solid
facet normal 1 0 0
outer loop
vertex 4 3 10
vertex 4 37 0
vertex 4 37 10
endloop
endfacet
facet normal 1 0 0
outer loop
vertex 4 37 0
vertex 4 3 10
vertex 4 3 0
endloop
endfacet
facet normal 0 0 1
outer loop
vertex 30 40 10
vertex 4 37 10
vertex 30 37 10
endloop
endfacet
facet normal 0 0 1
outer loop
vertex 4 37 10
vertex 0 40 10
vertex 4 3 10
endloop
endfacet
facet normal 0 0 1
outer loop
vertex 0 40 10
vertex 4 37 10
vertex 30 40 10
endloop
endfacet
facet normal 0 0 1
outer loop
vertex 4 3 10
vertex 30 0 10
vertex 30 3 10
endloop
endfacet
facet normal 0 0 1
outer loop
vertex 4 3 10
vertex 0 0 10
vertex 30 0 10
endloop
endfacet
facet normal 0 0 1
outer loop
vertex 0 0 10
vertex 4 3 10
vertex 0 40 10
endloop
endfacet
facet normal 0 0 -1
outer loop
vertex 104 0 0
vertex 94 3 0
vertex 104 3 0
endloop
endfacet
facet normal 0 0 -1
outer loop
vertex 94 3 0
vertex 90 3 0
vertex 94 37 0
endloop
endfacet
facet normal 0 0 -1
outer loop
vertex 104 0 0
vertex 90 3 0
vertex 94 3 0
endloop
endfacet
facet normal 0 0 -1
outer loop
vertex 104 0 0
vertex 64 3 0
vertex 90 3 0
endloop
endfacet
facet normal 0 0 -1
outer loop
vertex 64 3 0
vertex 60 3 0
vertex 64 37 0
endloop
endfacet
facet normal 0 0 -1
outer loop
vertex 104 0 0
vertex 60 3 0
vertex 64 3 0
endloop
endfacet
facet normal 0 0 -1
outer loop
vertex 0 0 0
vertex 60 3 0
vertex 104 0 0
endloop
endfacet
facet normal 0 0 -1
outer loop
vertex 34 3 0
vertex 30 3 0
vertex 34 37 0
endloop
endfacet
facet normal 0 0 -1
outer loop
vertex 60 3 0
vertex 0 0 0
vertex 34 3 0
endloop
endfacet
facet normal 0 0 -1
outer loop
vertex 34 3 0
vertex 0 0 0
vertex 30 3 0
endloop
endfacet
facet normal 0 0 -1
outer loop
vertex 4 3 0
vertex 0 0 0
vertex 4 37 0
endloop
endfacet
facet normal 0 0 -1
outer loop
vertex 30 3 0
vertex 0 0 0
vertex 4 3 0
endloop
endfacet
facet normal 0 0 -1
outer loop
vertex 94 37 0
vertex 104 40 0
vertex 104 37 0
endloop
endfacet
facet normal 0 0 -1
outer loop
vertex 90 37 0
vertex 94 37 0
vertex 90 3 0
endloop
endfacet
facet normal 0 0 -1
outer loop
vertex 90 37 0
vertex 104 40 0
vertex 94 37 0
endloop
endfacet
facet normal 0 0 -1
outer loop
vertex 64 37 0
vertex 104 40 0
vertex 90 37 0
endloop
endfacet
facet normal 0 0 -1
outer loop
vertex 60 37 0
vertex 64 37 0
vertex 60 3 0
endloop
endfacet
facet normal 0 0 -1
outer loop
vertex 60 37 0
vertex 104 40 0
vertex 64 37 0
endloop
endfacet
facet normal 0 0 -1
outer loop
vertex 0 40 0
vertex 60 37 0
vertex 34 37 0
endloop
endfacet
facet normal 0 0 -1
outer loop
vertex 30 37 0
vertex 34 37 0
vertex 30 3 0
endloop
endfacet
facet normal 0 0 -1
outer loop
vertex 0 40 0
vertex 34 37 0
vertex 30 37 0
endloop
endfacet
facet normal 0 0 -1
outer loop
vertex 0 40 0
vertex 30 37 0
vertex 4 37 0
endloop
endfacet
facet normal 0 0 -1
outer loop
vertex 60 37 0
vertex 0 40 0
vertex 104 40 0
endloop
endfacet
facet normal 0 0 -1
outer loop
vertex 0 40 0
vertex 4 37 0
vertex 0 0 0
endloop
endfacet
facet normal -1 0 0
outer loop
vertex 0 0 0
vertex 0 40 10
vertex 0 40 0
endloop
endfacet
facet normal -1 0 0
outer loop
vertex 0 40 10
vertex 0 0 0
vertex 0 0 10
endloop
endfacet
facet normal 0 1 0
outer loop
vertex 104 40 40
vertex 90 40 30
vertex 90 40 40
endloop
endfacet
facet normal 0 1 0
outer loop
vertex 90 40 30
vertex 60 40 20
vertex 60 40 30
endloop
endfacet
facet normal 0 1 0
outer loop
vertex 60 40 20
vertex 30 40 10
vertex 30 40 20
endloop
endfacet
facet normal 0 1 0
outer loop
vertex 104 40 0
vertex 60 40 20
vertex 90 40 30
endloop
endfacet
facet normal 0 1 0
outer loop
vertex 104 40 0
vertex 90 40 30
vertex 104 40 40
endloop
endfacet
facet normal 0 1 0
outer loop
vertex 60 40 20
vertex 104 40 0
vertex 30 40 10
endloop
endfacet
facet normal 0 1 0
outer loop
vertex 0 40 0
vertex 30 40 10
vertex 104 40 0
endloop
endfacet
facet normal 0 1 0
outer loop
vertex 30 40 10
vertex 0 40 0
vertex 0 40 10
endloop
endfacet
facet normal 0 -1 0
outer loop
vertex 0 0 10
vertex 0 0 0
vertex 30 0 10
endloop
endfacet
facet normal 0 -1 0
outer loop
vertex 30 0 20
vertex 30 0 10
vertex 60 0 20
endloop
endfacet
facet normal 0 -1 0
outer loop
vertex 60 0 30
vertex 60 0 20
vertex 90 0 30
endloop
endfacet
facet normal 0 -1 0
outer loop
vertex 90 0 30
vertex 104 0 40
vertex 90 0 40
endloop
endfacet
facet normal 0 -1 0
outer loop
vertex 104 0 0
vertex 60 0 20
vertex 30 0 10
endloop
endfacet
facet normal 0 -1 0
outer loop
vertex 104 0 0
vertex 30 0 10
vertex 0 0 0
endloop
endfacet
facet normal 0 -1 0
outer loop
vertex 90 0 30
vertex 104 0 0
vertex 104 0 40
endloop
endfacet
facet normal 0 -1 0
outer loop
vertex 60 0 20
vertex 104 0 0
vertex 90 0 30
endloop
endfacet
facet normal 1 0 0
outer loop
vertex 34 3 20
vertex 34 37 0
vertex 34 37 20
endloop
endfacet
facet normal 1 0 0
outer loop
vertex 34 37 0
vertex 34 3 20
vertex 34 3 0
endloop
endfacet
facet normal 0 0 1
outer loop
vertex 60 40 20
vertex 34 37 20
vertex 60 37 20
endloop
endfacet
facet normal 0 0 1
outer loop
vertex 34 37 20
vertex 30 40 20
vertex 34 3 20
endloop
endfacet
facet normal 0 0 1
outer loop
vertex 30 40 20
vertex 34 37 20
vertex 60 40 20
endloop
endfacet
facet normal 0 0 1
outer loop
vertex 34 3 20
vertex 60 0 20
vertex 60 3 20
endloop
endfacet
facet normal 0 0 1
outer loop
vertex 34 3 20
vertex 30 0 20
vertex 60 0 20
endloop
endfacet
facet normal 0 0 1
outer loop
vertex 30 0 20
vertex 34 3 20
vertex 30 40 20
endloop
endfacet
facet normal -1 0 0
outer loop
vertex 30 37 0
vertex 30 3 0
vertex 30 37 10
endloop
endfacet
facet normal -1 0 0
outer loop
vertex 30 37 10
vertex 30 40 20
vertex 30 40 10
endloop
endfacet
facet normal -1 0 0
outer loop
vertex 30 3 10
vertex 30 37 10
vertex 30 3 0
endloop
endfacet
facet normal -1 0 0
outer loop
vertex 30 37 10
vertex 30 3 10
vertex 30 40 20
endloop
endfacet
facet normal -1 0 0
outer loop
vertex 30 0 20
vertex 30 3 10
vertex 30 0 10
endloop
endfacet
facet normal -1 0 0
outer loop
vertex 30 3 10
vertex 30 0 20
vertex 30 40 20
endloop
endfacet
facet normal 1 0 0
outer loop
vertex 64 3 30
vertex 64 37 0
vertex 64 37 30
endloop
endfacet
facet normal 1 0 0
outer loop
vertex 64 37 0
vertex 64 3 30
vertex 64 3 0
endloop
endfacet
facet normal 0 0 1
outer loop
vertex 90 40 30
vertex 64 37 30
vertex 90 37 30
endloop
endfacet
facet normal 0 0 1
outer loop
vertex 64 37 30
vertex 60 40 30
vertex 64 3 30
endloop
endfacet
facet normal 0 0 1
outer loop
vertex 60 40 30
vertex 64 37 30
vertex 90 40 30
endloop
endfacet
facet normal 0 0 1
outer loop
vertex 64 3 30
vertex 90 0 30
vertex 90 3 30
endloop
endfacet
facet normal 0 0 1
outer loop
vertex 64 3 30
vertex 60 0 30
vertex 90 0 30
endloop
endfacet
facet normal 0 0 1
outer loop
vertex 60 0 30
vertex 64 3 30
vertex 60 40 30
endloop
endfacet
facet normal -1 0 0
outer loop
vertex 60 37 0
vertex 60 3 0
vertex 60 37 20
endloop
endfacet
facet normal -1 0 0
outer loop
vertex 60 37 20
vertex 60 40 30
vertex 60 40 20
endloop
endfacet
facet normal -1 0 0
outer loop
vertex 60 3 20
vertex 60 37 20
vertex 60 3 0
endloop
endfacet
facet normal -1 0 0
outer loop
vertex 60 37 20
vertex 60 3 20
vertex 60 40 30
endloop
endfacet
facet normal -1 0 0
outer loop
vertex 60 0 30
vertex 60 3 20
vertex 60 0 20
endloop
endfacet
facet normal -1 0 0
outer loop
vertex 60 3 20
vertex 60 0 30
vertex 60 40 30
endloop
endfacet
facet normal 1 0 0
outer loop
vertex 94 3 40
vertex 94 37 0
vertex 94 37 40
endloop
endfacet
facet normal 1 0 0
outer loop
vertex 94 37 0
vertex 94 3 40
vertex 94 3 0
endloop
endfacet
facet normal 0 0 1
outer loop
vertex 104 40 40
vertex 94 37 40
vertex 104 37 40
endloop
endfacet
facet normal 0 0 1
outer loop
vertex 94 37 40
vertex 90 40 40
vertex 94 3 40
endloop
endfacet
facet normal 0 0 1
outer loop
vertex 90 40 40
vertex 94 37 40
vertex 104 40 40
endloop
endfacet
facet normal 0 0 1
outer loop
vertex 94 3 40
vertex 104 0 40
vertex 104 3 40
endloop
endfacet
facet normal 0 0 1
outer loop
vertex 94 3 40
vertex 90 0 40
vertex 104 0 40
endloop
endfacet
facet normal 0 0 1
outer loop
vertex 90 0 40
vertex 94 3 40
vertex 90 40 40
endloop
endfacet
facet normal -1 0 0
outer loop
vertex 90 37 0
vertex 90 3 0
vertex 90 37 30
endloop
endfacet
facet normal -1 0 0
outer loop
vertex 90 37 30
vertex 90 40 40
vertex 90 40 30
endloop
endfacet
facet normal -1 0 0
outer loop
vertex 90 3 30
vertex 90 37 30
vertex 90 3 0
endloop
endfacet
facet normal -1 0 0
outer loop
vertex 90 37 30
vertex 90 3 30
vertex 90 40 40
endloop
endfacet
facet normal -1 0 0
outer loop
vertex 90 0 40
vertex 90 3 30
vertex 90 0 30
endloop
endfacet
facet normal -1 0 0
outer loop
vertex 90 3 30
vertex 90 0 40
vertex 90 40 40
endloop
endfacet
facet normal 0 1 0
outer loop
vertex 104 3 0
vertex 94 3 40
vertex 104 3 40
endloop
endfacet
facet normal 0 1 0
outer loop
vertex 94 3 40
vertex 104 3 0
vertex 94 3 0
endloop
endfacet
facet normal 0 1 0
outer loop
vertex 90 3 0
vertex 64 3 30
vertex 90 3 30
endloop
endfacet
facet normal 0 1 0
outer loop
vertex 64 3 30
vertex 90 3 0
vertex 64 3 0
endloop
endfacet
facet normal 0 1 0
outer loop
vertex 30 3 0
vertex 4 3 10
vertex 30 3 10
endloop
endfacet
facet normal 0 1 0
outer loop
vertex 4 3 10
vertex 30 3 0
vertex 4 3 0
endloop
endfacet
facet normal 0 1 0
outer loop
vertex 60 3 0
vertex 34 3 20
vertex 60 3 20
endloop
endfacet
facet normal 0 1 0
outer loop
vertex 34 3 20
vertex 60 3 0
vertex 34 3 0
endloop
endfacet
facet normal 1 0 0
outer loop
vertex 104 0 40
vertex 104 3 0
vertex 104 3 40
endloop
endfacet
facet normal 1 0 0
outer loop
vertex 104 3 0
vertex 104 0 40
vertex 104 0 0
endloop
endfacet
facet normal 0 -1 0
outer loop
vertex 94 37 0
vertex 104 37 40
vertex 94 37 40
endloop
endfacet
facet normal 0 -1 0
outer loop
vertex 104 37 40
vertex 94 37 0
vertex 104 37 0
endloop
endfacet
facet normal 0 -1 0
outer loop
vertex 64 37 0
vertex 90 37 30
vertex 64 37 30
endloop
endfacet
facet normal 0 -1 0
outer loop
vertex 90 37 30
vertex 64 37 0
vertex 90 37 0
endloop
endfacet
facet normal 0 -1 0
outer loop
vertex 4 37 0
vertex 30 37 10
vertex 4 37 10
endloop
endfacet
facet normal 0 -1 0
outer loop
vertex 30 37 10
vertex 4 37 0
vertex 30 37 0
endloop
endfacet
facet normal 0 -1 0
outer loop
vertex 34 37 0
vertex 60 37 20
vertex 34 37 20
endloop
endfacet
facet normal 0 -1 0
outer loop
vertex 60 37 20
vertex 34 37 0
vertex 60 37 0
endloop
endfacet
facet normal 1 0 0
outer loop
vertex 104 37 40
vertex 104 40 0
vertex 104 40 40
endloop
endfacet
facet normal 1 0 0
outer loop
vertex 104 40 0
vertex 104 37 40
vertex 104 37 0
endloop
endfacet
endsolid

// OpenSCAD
/*[global]*/
//number of steps 
number_steps = 4; 
//length of rack
length = 40;

/*[rack]*/
//spacing below last shelf
bottom_spacing = 10;
//offset from front
offset_from_front = 0;
side_thickness = 3;

/*[shelf]*/
//thickness of shelf
shelf_thickness = 4;
//depth of top shelf
top_shelf_depth = 10;
//increment in depth every step
shelf_depth_increment = 10;
//spacing (including shelf_thickness)
spacing_between_shelves = 30; 
  
total_height = number_steps* (shelf_thickness + spacing_between_shelves)
                +bottom_spacing;
   
shelves();  
sides();
translate([0,length-side_thickness,0])
sides(); 
  
module rack_side(depth, height){ 
    translate([shelf_thickness,0,0])
    cube([height, side_thickness , depth]);
}  
module shelf( depth ){
    
    cube([shelf_thickness, length, depth]);
}


module sides(){
    for(increment =[0:number_steps-2]){
        echo("current index: ", increment);
        shelf_depth = top_shelf_depth + increment*shelf_depth_increment; 
        
        translate([increment*spacing_between_shelves, 0,0]){
            rack_side(shelf_depth, spacing_between_shelves); 
        }
    } 
    //base
    increment = number_steps-1;
    shelf_depth = top_shelf_depth 
                + increment *shelf_depth_increment; 
    translate([increment*spacing_between_shelves, 0,0]) 
    rack_side(shelf_depth, bottom_spacing); 
    
}

module shelves(){
    for(increment =[0:number_steps-1]){
        echo("current index: ", increment);
        shelf_depth = top_shelf_depth + increment*shelf_depth_increment; 
        
        translate([increment*spacing_between_shelves, 0,0]){
            
            shelf( shelf_depth);  
        }
    } 
}
